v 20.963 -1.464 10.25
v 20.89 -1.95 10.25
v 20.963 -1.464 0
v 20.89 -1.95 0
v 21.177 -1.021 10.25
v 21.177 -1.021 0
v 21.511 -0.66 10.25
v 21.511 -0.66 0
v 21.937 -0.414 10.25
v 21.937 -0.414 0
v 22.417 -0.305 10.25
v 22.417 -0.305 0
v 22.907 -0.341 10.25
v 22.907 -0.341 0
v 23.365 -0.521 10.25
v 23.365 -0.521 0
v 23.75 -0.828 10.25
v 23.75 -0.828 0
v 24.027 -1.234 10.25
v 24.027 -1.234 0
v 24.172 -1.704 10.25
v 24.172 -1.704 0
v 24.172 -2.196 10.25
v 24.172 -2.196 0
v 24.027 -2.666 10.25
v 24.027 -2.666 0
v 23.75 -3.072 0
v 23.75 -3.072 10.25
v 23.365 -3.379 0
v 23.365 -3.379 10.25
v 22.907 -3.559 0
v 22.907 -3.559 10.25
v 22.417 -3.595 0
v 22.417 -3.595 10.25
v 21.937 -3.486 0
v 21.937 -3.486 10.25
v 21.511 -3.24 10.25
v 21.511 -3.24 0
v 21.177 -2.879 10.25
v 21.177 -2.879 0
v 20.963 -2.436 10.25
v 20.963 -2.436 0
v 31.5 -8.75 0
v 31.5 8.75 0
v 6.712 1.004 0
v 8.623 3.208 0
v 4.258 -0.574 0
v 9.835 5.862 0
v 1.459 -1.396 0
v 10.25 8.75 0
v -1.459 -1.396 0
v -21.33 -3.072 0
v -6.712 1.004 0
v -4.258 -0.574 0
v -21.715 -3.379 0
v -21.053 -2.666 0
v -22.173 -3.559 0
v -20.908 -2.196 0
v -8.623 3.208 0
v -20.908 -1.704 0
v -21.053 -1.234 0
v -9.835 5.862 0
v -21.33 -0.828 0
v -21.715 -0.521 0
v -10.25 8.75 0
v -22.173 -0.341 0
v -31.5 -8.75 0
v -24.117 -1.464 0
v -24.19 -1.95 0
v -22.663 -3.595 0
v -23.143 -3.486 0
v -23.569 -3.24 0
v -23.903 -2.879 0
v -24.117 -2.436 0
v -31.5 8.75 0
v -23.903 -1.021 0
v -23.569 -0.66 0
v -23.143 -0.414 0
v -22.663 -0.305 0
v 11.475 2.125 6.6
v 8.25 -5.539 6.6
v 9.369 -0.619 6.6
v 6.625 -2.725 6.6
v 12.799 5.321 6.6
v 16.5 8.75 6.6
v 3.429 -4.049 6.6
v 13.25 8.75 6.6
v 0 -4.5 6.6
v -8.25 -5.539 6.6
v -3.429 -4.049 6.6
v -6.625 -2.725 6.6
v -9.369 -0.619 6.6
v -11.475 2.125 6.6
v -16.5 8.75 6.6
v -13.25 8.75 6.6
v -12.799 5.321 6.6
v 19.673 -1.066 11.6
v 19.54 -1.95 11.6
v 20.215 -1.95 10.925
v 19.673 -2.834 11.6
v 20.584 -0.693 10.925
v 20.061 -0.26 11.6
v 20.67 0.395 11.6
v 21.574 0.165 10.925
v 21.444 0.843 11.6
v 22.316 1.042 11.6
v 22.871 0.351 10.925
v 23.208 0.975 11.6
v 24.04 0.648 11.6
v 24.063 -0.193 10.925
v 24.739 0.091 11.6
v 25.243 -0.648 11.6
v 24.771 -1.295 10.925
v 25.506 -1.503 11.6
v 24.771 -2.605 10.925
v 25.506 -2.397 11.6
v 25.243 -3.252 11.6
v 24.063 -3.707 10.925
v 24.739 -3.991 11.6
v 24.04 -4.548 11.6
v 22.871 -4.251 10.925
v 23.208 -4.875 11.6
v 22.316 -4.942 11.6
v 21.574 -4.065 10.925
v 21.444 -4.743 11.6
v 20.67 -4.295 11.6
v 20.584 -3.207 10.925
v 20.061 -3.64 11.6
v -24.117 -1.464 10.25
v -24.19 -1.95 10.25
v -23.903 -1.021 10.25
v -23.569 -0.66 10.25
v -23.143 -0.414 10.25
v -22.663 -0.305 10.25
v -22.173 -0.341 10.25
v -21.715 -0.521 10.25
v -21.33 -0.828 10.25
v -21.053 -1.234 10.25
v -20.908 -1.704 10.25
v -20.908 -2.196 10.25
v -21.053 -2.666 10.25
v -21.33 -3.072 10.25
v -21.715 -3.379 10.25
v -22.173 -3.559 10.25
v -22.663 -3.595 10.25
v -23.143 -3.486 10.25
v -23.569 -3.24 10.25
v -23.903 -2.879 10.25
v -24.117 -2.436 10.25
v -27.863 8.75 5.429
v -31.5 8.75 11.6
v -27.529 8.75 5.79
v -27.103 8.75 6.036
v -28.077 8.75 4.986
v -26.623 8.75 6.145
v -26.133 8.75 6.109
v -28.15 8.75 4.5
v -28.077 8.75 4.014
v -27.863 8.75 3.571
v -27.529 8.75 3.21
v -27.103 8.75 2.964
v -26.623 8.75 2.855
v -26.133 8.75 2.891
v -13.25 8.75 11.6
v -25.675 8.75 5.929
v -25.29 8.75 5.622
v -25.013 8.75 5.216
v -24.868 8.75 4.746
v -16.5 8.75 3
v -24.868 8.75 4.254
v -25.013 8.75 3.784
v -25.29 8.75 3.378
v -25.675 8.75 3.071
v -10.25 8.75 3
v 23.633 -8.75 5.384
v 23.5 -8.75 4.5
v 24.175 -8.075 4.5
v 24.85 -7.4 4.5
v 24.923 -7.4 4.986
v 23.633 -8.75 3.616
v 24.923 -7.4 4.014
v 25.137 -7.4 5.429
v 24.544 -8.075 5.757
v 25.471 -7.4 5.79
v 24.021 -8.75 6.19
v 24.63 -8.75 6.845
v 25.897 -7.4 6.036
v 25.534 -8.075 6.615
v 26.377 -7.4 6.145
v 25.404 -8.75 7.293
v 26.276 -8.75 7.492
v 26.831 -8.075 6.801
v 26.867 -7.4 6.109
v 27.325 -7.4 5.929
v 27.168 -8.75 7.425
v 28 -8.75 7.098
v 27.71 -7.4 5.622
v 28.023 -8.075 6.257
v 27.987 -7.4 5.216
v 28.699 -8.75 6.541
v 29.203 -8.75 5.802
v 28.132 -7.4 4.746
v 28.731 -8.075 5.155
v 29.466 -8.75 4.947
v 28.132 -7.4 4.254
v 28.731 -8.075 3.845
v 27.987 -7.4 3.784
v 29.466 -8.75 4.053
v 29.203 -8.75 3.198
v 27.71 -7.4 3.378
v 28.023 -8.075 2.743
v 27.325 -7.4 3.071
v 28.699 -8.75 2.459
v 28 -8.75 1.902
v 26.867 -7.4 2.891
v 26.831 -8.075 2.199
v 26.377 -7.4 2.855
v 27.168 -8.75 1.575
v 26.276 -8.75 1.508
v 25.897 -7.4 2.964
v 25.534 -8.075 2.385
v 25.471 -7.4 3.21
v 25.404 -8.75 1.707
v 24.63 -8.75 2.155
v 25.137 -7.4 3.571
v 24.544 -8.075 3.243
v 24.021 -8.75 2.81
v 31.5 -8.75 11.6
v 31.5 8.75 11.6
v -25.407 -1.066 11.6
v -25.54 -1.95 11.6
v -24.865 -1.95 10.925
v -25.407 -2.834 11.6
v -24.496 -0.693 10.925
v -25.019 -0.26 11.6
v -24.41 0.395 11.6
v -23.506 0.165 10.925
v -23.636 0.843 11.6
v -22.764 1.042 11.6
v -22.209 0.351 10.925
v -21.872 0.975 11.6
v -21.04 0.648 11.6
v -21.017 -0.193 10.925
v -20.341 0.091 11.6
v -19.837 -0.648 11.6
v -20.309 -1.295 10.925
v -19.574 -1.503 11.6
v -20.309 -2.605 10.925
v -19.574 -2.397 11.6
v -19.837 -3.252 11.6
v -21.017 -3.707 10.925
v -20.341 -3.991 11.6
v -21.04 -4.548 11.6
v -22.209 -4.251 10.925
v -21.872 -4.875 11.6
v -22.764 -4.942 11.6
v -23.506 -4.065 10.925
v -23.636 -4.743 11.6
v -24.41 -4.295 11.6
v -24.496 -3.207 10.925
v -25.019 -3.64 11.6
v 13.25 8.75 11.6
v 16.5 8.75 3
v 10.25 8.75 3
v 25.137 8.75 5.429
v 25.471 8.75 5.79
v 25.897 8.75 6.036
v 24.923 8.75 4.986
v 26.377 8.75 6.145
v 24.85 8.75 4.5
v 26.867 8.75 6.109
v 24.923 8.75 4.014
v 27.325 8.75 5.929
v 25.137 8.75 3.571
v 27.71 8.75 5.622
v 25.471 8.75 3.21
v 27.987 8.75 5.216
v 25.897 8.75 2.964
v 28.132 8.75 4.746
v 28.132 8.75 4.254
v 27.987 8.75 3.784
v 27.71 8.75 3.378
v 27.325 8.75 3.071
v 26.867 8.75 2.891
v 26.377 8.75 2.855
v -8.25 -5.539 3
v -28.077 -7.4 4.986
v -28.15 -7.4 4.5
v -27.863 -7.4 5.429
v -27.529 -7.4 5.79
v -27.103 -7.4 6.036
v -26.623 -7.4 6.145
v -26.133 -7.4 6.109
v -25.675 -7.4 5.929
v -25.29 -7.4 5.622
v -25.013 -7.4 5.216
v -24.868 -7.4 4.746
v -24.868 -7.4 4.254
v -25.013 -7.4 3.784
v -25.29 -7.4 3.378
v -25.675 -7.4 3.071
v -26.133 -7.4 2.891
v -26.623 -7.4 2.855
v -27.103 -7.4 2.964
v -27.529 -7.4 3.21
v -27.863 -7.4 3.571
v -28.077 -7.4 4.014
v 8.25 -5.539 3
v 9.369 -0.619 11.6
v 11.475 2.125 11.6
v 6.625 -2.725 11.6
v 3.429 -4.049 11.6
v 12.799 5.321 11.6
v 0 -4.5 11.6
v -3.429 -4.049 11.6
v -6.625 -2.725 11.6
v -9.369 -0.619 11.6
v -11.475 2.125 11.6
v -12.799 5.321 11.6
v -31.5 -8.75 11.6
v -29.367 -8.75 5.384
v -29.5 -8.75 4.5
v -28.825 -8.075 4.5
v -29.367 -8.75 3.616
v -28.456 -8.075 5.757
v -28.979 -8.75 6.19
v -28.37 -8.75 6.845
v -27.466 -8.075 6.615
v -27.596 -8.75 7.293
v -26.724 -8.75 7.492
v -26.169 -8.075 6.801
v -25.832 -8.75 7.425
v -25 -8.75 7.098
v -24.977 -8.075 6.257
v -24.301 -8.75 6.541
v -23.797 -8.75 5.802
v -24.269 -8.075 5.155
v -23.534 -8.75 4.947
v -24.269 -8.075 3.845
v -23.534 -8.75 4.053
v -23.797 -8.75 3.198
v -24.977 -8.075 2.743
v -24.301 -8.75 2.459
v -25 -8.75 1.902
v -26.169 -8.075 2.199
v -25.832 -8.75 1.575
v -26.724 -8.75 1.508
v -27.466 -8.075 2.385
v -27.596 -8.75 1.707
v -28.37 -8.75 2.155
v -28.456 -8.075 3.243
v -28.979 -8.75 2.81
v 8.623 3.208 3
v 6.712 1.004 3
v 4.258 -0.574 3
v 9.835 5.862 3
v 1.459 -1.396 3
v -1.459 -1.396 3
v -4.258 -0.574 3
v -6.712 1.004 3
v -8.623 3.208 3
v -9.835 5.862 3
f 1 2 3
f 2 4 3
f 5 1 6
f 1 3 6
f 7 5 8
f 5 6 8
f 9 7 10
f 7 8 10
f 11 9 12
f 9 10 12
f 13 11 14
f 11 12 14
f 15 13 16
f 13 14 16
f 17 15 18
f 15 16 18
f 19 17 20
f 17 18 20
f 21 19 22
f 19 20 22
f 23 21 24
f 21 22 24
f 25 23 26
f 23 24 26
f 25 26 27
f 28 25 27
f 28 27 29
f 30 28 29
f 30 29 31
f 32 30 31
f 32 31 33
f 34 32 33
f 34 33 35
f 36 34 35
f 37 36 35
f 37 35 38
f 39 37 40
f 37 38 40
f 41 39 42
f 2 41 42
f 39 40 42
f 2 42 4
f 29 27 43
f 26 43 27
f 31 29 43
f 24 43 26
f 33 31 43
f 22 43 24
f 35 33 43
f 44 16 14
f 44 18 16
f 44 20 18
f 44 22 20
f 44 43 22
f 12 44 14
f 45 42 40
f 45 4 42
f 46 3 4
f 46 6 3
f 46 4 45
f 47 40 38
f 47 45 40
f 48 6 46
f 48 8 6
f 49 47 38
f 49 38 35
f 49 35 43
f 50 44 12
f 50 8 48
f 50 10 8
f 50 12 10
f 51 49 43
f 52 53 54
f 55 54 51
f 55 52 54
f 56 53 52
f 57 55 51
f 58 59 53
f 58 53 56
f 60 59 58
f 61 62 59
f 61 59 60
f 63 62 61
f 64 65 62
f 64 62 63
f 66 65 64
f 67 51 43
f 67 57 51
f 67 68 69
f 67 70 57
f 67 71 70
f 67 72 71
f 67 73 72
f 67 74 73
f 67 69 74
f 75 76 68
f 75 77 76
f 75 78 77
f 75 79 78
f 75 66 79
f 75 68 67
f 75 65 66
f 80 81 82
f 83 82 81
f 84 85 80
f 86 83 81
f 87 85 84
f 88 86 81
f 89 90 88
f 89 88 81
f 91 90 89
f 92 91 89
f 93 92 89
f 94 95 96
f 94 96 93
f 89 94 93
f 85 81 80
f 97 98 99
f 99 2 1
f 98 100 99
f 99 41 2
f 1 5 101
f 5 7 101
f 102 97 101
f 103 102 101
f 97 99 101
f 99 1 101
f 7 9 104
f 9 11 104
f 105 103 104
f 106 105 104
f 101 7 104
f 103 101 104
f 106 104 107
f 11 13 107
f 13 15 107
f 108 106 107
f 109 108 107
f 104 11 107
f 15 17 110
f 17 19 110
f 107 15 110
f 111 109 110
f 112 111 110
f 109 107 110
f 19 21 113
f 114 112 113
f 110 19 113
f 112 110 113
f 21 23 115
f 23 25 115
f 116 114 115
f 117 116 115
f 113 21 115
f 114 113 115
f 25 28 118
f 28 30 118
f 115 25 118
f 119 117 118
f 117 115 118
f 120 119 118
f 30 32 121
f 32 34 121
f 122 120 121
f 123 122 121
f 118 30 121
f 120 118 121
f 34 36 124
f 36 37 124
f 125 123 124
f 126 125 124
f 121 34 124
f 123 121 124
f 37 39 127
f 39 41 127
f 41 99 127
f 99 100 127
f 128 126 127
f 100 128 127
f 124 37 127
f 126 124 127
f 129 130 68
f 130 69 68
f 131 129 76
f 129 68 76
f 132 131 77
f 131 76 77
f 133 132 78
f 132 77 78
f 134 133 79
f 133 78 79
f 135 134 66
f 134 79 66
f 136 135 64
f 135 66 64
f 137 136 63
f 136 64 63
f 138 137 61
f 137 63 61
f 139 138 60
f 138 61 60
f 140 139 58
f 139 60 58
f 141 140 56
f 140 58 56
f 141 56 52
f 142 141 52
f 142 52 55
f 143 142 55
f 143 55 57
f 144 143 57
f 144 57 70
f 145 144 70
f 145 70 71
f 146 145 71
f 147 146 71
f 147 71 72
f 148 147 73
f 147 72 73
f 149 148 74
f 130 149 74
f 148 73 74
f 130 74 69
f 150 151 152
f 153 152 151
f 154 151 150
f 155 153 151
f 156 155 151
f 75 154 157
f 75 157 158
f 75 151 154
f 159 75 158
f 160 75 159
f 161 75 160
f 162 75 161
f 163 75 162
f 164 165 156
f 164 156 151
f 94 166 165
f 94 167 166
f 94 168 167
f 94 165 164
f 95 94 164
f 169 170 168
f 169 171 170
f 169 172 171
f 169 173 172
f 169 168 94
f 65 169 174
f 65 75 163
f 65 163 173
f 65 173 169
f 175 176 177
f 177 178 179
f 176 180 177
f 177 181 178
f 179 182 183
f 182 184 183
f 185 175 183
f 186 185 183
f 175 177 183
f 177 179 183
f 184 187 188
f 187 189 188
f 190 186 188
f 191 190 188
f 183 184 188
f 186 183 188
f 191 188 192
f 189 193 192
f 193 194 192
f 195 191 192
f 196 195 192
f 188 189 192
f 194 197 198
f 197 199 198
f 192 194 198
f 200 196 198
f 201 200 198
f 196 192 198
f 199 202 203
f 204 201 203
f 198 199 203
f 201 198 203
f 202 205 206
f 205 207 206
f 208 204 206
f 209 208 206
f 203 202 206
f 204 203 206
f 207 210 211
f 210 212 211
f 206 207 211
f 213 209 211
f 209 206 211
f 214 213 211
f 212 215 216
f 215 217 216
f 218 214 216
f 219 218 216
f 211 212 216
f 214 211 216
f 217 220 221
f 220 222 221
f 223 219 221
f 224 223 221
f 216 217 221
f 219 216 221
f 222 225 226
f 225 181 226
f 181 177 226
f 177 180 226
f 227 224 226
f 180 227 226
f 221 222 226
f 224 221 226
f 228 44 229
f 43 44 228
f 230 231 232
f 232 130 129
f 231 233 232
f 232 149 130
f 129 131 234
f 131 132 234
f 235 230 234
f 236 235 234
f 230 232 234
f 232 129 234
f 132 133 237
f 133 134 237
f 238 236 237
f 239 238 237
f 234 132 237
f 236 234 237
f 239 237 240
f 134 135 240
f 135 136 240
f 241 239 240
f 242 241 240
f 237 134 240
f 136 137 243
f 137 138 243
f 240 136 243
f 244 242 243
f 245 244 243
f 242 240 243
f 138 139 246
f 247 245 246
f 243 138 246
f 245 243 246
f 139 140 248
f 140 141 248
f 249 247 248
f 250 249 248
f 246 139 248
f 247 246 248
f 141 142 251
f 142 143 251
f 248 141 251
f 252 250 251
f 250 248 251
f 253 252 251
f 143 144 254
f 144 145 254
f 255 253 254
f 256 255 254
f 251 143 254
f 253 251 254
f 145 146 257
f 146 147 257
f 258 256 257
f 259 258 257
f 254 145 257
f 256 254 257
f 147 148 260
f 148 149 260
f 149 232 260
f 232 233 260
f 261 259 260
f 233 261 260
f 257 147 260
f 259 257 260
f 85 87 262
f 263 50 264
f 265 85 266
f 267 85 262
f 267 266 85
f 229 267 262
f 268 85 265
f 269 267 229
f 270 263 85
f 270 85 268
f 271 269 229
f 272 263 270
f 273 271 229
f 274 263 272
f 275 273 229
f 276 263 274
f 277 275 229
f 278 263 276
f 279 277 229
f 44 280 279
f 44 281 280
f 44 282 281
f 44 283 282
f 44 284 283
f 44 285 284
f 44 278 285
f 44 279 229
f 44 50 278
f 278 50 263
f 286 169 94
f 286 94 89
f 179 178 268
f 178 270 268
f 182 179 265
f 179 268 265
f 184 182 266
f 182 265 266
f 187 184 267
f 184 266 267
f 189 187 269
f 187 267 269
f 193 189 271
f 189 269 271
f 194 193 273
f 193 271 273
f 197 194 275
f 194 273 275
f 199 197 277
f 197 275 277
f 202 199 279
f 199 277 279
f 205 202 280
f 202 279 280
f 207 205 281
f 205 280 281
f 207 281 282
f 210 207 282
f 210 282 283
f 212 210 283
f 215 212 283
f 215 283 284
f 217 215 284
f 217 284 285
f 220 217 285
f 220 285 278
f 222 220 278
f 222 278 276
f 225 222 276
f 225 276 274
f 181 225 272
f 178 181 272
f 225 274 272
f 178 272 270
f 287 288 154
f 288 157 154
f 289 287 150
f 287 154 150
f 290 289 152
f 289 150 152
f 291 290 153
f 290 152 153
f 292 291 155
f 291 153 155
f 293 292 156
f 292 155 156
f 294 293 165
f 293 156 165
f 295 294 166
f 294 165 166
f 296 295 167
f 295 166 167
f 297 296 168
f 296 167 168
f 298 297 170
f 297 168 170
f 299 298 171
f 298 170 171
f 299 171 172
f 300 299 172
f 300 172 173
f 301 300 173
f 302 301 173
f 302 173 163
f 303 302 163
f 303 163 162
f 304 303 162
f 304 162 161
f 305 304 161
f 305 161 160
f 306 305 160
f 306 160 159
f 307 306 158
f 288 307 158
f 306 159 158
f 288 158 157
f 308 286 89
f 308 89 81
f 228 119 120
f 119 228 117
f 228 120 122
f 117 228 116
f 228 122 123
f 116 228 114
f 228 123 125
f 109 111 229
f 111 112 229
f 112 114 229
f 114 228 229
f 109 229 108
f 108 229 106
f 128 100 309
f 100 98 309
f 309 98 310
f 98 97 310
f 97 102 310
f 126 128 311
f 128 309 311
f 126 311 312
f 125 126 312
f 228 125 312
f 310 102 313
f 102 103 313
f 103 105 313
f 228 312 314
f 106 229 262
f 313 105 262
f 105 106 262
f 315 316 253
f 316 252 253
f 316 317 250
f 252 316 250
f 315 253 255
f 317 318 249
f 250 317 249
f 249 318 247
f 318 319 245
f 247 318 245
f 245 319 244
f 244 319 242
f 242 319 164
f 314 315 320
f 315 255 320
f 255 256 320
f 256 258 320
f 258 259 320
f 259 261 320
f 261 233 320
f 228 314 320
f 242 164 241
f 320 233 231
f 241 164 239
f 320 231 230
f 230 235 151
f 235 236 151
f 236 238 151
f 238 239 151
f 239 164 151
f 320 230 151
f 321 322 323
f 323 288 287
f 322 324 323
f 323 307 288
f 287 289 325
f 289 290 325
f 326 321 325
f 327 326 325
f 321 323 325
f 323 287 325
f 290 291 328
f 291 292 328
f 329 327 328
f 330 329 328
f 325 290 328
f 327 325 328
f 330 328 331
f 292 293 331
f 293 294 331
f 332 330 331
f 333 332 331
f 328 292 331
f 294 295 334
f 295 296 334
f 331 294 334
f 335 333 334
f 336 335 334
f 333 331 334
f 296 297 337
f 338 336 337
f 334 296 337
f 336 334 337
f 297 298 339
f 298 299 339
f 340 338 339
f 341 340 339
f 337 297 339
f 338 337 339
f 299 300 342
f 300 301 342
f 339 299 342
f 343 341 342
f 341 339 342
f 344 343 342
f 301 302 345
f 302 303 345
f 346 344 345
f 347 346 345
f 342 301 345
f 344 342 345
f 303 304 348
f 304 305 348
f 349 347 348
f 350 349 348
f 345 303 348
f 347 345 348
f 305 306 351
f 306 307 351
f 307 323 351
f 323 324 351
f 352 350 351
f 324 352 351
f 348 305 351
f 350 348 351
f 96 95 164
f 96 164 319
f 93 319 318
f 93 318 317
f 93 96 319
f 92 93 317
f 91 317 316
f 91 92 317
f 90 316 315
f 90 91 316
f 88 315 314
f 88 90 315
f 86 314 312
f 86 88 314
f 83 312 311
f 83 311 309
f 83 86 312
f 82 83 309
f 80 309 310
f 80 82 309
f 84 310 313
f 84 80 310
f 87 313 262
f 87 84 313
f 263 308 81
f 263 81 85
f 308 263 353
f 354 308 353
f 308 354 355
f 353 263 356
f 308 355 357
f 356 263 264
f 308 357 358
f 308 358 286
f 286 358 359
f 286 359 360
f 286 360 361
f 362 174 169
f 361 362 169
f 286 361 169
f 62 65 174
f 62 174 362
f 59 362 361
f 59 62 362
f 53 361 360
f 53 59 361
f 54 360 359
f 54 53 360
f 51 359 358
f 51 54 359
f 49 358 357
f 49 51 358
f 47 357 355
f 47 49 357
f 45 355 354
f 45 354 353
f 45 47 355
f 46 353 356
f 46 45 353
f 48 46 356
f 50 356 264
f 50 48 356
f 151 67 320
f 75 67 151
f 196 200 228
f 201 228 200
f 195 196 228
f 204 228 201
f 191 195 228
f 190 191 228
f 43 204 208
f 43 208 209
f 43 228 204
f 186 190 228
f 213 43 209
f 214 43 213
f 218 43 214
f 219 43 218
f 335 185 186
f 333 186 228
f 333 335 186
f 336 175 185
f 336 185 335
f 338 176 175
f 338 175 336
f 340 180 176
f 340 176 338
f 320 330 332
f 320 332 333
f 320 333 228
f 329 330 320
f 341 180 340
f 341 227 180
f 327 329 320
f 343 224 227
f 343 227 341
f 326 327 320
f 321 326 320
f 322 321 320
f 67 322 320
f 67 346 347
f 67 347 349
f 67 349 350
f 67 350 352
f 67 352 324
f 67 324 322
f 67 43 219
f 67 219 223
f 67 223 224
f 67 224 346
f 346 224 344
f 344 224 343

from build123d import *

# Parameters (mm, degrees)
PAD_DEPTH           = 3
PAD001_DEPTH        = 3.6
PAD002_DEPTH        = 5
HOLE001_D           = 3.3
HOLE001_DEPTH       = 25
HOLE001_CSINK_D     = 6
HOLE001_CSINK_ANGLE = 90
HOLE_D              = 3.3
HOLE_DEPTH          = 25
HOLE_CSINK_D        = 6
HOLE_CSINK_ANGLE    = 90


with BuildPart() as part:
    # Sketch → Pad (new body)
    with BuildSketch(Plane.XY):
        with BuildLine():
            Line((-31.5, 8.75), (-10.25, 8.75))
            ThreePointArc((-10.25, 8.75), (0, -1.5), (10.25, 8.75))
            Line((10.25, 8.75), (31.5, 8.75))
            Line((31.5, 8.75), (31.5, -8.75))
            Line((31.5, -8.75), (-31.5, -8.75))
            Line((-31.5, -8.75), (-31.5, 8.75))
        make_face()
    extrude(amount=PAD_DEPTH)

    # Sketch001 (on Face8 of Pad) → Pad001 (join)
    with BuildSketch(Plane.XY.offset(3)):
        Polygon((8.25, -5.539419), (16.5, 8.75), (31.5, 8.75), (31.5, -8.75), (-31.5, -8.75), (-31.5, 8.75), (-16.5, 8.75), (-8.25, -5.539419), align=None)
    extrude(amount=PAD001_DEPTH)

    # Sketch002 (on Face15 of Pad001) → Pad002 (join)
    with BuildSketch(Plane.XY.offset(6.6)):
        with BuildLine():
            Line((-31.5, 8.75), (-13.25, 8.75))
            ThreePointArc((-13.25, 8.75), (0, -4.5), (13.25, 8.75))
            Line((13.25, 8.75), (31.5, 8.75))
            Line((31.5, 8.75), (31.5, -8.75))
            Line((31.5, -8.75), (-31.5, -8.75))
            Line((-31.5, -8.75), (-31.5, 8.75))
        make_face()
    extrude(amount=PAD002_DEPTH)

    # Hole001
    with Locations(Plane.XY.offset(11.6)):
        with Locations((-22.54, -1.95), (22.54, -1.95)):
            CounterSinkHole(HOLE001_D / 2, HOLE001_CSINK_D / 2, depth=HOLE001_DEPTH, counter_sink_angle=HOLE001_CSINK_ANGLE)

    # Hole
    with Locations(Plane.XZ.offset(8.75)):
        with Locations((26.5, 4.5), (-26.5, 4.5)):
            CounterSinkHole(HOLE_D / 2, HOLE_CSINK_D / 2, depth=HOLE_DEPTH, counter_sink_angle=HOLE_CSINK_ANGLE)


solid = part.part
